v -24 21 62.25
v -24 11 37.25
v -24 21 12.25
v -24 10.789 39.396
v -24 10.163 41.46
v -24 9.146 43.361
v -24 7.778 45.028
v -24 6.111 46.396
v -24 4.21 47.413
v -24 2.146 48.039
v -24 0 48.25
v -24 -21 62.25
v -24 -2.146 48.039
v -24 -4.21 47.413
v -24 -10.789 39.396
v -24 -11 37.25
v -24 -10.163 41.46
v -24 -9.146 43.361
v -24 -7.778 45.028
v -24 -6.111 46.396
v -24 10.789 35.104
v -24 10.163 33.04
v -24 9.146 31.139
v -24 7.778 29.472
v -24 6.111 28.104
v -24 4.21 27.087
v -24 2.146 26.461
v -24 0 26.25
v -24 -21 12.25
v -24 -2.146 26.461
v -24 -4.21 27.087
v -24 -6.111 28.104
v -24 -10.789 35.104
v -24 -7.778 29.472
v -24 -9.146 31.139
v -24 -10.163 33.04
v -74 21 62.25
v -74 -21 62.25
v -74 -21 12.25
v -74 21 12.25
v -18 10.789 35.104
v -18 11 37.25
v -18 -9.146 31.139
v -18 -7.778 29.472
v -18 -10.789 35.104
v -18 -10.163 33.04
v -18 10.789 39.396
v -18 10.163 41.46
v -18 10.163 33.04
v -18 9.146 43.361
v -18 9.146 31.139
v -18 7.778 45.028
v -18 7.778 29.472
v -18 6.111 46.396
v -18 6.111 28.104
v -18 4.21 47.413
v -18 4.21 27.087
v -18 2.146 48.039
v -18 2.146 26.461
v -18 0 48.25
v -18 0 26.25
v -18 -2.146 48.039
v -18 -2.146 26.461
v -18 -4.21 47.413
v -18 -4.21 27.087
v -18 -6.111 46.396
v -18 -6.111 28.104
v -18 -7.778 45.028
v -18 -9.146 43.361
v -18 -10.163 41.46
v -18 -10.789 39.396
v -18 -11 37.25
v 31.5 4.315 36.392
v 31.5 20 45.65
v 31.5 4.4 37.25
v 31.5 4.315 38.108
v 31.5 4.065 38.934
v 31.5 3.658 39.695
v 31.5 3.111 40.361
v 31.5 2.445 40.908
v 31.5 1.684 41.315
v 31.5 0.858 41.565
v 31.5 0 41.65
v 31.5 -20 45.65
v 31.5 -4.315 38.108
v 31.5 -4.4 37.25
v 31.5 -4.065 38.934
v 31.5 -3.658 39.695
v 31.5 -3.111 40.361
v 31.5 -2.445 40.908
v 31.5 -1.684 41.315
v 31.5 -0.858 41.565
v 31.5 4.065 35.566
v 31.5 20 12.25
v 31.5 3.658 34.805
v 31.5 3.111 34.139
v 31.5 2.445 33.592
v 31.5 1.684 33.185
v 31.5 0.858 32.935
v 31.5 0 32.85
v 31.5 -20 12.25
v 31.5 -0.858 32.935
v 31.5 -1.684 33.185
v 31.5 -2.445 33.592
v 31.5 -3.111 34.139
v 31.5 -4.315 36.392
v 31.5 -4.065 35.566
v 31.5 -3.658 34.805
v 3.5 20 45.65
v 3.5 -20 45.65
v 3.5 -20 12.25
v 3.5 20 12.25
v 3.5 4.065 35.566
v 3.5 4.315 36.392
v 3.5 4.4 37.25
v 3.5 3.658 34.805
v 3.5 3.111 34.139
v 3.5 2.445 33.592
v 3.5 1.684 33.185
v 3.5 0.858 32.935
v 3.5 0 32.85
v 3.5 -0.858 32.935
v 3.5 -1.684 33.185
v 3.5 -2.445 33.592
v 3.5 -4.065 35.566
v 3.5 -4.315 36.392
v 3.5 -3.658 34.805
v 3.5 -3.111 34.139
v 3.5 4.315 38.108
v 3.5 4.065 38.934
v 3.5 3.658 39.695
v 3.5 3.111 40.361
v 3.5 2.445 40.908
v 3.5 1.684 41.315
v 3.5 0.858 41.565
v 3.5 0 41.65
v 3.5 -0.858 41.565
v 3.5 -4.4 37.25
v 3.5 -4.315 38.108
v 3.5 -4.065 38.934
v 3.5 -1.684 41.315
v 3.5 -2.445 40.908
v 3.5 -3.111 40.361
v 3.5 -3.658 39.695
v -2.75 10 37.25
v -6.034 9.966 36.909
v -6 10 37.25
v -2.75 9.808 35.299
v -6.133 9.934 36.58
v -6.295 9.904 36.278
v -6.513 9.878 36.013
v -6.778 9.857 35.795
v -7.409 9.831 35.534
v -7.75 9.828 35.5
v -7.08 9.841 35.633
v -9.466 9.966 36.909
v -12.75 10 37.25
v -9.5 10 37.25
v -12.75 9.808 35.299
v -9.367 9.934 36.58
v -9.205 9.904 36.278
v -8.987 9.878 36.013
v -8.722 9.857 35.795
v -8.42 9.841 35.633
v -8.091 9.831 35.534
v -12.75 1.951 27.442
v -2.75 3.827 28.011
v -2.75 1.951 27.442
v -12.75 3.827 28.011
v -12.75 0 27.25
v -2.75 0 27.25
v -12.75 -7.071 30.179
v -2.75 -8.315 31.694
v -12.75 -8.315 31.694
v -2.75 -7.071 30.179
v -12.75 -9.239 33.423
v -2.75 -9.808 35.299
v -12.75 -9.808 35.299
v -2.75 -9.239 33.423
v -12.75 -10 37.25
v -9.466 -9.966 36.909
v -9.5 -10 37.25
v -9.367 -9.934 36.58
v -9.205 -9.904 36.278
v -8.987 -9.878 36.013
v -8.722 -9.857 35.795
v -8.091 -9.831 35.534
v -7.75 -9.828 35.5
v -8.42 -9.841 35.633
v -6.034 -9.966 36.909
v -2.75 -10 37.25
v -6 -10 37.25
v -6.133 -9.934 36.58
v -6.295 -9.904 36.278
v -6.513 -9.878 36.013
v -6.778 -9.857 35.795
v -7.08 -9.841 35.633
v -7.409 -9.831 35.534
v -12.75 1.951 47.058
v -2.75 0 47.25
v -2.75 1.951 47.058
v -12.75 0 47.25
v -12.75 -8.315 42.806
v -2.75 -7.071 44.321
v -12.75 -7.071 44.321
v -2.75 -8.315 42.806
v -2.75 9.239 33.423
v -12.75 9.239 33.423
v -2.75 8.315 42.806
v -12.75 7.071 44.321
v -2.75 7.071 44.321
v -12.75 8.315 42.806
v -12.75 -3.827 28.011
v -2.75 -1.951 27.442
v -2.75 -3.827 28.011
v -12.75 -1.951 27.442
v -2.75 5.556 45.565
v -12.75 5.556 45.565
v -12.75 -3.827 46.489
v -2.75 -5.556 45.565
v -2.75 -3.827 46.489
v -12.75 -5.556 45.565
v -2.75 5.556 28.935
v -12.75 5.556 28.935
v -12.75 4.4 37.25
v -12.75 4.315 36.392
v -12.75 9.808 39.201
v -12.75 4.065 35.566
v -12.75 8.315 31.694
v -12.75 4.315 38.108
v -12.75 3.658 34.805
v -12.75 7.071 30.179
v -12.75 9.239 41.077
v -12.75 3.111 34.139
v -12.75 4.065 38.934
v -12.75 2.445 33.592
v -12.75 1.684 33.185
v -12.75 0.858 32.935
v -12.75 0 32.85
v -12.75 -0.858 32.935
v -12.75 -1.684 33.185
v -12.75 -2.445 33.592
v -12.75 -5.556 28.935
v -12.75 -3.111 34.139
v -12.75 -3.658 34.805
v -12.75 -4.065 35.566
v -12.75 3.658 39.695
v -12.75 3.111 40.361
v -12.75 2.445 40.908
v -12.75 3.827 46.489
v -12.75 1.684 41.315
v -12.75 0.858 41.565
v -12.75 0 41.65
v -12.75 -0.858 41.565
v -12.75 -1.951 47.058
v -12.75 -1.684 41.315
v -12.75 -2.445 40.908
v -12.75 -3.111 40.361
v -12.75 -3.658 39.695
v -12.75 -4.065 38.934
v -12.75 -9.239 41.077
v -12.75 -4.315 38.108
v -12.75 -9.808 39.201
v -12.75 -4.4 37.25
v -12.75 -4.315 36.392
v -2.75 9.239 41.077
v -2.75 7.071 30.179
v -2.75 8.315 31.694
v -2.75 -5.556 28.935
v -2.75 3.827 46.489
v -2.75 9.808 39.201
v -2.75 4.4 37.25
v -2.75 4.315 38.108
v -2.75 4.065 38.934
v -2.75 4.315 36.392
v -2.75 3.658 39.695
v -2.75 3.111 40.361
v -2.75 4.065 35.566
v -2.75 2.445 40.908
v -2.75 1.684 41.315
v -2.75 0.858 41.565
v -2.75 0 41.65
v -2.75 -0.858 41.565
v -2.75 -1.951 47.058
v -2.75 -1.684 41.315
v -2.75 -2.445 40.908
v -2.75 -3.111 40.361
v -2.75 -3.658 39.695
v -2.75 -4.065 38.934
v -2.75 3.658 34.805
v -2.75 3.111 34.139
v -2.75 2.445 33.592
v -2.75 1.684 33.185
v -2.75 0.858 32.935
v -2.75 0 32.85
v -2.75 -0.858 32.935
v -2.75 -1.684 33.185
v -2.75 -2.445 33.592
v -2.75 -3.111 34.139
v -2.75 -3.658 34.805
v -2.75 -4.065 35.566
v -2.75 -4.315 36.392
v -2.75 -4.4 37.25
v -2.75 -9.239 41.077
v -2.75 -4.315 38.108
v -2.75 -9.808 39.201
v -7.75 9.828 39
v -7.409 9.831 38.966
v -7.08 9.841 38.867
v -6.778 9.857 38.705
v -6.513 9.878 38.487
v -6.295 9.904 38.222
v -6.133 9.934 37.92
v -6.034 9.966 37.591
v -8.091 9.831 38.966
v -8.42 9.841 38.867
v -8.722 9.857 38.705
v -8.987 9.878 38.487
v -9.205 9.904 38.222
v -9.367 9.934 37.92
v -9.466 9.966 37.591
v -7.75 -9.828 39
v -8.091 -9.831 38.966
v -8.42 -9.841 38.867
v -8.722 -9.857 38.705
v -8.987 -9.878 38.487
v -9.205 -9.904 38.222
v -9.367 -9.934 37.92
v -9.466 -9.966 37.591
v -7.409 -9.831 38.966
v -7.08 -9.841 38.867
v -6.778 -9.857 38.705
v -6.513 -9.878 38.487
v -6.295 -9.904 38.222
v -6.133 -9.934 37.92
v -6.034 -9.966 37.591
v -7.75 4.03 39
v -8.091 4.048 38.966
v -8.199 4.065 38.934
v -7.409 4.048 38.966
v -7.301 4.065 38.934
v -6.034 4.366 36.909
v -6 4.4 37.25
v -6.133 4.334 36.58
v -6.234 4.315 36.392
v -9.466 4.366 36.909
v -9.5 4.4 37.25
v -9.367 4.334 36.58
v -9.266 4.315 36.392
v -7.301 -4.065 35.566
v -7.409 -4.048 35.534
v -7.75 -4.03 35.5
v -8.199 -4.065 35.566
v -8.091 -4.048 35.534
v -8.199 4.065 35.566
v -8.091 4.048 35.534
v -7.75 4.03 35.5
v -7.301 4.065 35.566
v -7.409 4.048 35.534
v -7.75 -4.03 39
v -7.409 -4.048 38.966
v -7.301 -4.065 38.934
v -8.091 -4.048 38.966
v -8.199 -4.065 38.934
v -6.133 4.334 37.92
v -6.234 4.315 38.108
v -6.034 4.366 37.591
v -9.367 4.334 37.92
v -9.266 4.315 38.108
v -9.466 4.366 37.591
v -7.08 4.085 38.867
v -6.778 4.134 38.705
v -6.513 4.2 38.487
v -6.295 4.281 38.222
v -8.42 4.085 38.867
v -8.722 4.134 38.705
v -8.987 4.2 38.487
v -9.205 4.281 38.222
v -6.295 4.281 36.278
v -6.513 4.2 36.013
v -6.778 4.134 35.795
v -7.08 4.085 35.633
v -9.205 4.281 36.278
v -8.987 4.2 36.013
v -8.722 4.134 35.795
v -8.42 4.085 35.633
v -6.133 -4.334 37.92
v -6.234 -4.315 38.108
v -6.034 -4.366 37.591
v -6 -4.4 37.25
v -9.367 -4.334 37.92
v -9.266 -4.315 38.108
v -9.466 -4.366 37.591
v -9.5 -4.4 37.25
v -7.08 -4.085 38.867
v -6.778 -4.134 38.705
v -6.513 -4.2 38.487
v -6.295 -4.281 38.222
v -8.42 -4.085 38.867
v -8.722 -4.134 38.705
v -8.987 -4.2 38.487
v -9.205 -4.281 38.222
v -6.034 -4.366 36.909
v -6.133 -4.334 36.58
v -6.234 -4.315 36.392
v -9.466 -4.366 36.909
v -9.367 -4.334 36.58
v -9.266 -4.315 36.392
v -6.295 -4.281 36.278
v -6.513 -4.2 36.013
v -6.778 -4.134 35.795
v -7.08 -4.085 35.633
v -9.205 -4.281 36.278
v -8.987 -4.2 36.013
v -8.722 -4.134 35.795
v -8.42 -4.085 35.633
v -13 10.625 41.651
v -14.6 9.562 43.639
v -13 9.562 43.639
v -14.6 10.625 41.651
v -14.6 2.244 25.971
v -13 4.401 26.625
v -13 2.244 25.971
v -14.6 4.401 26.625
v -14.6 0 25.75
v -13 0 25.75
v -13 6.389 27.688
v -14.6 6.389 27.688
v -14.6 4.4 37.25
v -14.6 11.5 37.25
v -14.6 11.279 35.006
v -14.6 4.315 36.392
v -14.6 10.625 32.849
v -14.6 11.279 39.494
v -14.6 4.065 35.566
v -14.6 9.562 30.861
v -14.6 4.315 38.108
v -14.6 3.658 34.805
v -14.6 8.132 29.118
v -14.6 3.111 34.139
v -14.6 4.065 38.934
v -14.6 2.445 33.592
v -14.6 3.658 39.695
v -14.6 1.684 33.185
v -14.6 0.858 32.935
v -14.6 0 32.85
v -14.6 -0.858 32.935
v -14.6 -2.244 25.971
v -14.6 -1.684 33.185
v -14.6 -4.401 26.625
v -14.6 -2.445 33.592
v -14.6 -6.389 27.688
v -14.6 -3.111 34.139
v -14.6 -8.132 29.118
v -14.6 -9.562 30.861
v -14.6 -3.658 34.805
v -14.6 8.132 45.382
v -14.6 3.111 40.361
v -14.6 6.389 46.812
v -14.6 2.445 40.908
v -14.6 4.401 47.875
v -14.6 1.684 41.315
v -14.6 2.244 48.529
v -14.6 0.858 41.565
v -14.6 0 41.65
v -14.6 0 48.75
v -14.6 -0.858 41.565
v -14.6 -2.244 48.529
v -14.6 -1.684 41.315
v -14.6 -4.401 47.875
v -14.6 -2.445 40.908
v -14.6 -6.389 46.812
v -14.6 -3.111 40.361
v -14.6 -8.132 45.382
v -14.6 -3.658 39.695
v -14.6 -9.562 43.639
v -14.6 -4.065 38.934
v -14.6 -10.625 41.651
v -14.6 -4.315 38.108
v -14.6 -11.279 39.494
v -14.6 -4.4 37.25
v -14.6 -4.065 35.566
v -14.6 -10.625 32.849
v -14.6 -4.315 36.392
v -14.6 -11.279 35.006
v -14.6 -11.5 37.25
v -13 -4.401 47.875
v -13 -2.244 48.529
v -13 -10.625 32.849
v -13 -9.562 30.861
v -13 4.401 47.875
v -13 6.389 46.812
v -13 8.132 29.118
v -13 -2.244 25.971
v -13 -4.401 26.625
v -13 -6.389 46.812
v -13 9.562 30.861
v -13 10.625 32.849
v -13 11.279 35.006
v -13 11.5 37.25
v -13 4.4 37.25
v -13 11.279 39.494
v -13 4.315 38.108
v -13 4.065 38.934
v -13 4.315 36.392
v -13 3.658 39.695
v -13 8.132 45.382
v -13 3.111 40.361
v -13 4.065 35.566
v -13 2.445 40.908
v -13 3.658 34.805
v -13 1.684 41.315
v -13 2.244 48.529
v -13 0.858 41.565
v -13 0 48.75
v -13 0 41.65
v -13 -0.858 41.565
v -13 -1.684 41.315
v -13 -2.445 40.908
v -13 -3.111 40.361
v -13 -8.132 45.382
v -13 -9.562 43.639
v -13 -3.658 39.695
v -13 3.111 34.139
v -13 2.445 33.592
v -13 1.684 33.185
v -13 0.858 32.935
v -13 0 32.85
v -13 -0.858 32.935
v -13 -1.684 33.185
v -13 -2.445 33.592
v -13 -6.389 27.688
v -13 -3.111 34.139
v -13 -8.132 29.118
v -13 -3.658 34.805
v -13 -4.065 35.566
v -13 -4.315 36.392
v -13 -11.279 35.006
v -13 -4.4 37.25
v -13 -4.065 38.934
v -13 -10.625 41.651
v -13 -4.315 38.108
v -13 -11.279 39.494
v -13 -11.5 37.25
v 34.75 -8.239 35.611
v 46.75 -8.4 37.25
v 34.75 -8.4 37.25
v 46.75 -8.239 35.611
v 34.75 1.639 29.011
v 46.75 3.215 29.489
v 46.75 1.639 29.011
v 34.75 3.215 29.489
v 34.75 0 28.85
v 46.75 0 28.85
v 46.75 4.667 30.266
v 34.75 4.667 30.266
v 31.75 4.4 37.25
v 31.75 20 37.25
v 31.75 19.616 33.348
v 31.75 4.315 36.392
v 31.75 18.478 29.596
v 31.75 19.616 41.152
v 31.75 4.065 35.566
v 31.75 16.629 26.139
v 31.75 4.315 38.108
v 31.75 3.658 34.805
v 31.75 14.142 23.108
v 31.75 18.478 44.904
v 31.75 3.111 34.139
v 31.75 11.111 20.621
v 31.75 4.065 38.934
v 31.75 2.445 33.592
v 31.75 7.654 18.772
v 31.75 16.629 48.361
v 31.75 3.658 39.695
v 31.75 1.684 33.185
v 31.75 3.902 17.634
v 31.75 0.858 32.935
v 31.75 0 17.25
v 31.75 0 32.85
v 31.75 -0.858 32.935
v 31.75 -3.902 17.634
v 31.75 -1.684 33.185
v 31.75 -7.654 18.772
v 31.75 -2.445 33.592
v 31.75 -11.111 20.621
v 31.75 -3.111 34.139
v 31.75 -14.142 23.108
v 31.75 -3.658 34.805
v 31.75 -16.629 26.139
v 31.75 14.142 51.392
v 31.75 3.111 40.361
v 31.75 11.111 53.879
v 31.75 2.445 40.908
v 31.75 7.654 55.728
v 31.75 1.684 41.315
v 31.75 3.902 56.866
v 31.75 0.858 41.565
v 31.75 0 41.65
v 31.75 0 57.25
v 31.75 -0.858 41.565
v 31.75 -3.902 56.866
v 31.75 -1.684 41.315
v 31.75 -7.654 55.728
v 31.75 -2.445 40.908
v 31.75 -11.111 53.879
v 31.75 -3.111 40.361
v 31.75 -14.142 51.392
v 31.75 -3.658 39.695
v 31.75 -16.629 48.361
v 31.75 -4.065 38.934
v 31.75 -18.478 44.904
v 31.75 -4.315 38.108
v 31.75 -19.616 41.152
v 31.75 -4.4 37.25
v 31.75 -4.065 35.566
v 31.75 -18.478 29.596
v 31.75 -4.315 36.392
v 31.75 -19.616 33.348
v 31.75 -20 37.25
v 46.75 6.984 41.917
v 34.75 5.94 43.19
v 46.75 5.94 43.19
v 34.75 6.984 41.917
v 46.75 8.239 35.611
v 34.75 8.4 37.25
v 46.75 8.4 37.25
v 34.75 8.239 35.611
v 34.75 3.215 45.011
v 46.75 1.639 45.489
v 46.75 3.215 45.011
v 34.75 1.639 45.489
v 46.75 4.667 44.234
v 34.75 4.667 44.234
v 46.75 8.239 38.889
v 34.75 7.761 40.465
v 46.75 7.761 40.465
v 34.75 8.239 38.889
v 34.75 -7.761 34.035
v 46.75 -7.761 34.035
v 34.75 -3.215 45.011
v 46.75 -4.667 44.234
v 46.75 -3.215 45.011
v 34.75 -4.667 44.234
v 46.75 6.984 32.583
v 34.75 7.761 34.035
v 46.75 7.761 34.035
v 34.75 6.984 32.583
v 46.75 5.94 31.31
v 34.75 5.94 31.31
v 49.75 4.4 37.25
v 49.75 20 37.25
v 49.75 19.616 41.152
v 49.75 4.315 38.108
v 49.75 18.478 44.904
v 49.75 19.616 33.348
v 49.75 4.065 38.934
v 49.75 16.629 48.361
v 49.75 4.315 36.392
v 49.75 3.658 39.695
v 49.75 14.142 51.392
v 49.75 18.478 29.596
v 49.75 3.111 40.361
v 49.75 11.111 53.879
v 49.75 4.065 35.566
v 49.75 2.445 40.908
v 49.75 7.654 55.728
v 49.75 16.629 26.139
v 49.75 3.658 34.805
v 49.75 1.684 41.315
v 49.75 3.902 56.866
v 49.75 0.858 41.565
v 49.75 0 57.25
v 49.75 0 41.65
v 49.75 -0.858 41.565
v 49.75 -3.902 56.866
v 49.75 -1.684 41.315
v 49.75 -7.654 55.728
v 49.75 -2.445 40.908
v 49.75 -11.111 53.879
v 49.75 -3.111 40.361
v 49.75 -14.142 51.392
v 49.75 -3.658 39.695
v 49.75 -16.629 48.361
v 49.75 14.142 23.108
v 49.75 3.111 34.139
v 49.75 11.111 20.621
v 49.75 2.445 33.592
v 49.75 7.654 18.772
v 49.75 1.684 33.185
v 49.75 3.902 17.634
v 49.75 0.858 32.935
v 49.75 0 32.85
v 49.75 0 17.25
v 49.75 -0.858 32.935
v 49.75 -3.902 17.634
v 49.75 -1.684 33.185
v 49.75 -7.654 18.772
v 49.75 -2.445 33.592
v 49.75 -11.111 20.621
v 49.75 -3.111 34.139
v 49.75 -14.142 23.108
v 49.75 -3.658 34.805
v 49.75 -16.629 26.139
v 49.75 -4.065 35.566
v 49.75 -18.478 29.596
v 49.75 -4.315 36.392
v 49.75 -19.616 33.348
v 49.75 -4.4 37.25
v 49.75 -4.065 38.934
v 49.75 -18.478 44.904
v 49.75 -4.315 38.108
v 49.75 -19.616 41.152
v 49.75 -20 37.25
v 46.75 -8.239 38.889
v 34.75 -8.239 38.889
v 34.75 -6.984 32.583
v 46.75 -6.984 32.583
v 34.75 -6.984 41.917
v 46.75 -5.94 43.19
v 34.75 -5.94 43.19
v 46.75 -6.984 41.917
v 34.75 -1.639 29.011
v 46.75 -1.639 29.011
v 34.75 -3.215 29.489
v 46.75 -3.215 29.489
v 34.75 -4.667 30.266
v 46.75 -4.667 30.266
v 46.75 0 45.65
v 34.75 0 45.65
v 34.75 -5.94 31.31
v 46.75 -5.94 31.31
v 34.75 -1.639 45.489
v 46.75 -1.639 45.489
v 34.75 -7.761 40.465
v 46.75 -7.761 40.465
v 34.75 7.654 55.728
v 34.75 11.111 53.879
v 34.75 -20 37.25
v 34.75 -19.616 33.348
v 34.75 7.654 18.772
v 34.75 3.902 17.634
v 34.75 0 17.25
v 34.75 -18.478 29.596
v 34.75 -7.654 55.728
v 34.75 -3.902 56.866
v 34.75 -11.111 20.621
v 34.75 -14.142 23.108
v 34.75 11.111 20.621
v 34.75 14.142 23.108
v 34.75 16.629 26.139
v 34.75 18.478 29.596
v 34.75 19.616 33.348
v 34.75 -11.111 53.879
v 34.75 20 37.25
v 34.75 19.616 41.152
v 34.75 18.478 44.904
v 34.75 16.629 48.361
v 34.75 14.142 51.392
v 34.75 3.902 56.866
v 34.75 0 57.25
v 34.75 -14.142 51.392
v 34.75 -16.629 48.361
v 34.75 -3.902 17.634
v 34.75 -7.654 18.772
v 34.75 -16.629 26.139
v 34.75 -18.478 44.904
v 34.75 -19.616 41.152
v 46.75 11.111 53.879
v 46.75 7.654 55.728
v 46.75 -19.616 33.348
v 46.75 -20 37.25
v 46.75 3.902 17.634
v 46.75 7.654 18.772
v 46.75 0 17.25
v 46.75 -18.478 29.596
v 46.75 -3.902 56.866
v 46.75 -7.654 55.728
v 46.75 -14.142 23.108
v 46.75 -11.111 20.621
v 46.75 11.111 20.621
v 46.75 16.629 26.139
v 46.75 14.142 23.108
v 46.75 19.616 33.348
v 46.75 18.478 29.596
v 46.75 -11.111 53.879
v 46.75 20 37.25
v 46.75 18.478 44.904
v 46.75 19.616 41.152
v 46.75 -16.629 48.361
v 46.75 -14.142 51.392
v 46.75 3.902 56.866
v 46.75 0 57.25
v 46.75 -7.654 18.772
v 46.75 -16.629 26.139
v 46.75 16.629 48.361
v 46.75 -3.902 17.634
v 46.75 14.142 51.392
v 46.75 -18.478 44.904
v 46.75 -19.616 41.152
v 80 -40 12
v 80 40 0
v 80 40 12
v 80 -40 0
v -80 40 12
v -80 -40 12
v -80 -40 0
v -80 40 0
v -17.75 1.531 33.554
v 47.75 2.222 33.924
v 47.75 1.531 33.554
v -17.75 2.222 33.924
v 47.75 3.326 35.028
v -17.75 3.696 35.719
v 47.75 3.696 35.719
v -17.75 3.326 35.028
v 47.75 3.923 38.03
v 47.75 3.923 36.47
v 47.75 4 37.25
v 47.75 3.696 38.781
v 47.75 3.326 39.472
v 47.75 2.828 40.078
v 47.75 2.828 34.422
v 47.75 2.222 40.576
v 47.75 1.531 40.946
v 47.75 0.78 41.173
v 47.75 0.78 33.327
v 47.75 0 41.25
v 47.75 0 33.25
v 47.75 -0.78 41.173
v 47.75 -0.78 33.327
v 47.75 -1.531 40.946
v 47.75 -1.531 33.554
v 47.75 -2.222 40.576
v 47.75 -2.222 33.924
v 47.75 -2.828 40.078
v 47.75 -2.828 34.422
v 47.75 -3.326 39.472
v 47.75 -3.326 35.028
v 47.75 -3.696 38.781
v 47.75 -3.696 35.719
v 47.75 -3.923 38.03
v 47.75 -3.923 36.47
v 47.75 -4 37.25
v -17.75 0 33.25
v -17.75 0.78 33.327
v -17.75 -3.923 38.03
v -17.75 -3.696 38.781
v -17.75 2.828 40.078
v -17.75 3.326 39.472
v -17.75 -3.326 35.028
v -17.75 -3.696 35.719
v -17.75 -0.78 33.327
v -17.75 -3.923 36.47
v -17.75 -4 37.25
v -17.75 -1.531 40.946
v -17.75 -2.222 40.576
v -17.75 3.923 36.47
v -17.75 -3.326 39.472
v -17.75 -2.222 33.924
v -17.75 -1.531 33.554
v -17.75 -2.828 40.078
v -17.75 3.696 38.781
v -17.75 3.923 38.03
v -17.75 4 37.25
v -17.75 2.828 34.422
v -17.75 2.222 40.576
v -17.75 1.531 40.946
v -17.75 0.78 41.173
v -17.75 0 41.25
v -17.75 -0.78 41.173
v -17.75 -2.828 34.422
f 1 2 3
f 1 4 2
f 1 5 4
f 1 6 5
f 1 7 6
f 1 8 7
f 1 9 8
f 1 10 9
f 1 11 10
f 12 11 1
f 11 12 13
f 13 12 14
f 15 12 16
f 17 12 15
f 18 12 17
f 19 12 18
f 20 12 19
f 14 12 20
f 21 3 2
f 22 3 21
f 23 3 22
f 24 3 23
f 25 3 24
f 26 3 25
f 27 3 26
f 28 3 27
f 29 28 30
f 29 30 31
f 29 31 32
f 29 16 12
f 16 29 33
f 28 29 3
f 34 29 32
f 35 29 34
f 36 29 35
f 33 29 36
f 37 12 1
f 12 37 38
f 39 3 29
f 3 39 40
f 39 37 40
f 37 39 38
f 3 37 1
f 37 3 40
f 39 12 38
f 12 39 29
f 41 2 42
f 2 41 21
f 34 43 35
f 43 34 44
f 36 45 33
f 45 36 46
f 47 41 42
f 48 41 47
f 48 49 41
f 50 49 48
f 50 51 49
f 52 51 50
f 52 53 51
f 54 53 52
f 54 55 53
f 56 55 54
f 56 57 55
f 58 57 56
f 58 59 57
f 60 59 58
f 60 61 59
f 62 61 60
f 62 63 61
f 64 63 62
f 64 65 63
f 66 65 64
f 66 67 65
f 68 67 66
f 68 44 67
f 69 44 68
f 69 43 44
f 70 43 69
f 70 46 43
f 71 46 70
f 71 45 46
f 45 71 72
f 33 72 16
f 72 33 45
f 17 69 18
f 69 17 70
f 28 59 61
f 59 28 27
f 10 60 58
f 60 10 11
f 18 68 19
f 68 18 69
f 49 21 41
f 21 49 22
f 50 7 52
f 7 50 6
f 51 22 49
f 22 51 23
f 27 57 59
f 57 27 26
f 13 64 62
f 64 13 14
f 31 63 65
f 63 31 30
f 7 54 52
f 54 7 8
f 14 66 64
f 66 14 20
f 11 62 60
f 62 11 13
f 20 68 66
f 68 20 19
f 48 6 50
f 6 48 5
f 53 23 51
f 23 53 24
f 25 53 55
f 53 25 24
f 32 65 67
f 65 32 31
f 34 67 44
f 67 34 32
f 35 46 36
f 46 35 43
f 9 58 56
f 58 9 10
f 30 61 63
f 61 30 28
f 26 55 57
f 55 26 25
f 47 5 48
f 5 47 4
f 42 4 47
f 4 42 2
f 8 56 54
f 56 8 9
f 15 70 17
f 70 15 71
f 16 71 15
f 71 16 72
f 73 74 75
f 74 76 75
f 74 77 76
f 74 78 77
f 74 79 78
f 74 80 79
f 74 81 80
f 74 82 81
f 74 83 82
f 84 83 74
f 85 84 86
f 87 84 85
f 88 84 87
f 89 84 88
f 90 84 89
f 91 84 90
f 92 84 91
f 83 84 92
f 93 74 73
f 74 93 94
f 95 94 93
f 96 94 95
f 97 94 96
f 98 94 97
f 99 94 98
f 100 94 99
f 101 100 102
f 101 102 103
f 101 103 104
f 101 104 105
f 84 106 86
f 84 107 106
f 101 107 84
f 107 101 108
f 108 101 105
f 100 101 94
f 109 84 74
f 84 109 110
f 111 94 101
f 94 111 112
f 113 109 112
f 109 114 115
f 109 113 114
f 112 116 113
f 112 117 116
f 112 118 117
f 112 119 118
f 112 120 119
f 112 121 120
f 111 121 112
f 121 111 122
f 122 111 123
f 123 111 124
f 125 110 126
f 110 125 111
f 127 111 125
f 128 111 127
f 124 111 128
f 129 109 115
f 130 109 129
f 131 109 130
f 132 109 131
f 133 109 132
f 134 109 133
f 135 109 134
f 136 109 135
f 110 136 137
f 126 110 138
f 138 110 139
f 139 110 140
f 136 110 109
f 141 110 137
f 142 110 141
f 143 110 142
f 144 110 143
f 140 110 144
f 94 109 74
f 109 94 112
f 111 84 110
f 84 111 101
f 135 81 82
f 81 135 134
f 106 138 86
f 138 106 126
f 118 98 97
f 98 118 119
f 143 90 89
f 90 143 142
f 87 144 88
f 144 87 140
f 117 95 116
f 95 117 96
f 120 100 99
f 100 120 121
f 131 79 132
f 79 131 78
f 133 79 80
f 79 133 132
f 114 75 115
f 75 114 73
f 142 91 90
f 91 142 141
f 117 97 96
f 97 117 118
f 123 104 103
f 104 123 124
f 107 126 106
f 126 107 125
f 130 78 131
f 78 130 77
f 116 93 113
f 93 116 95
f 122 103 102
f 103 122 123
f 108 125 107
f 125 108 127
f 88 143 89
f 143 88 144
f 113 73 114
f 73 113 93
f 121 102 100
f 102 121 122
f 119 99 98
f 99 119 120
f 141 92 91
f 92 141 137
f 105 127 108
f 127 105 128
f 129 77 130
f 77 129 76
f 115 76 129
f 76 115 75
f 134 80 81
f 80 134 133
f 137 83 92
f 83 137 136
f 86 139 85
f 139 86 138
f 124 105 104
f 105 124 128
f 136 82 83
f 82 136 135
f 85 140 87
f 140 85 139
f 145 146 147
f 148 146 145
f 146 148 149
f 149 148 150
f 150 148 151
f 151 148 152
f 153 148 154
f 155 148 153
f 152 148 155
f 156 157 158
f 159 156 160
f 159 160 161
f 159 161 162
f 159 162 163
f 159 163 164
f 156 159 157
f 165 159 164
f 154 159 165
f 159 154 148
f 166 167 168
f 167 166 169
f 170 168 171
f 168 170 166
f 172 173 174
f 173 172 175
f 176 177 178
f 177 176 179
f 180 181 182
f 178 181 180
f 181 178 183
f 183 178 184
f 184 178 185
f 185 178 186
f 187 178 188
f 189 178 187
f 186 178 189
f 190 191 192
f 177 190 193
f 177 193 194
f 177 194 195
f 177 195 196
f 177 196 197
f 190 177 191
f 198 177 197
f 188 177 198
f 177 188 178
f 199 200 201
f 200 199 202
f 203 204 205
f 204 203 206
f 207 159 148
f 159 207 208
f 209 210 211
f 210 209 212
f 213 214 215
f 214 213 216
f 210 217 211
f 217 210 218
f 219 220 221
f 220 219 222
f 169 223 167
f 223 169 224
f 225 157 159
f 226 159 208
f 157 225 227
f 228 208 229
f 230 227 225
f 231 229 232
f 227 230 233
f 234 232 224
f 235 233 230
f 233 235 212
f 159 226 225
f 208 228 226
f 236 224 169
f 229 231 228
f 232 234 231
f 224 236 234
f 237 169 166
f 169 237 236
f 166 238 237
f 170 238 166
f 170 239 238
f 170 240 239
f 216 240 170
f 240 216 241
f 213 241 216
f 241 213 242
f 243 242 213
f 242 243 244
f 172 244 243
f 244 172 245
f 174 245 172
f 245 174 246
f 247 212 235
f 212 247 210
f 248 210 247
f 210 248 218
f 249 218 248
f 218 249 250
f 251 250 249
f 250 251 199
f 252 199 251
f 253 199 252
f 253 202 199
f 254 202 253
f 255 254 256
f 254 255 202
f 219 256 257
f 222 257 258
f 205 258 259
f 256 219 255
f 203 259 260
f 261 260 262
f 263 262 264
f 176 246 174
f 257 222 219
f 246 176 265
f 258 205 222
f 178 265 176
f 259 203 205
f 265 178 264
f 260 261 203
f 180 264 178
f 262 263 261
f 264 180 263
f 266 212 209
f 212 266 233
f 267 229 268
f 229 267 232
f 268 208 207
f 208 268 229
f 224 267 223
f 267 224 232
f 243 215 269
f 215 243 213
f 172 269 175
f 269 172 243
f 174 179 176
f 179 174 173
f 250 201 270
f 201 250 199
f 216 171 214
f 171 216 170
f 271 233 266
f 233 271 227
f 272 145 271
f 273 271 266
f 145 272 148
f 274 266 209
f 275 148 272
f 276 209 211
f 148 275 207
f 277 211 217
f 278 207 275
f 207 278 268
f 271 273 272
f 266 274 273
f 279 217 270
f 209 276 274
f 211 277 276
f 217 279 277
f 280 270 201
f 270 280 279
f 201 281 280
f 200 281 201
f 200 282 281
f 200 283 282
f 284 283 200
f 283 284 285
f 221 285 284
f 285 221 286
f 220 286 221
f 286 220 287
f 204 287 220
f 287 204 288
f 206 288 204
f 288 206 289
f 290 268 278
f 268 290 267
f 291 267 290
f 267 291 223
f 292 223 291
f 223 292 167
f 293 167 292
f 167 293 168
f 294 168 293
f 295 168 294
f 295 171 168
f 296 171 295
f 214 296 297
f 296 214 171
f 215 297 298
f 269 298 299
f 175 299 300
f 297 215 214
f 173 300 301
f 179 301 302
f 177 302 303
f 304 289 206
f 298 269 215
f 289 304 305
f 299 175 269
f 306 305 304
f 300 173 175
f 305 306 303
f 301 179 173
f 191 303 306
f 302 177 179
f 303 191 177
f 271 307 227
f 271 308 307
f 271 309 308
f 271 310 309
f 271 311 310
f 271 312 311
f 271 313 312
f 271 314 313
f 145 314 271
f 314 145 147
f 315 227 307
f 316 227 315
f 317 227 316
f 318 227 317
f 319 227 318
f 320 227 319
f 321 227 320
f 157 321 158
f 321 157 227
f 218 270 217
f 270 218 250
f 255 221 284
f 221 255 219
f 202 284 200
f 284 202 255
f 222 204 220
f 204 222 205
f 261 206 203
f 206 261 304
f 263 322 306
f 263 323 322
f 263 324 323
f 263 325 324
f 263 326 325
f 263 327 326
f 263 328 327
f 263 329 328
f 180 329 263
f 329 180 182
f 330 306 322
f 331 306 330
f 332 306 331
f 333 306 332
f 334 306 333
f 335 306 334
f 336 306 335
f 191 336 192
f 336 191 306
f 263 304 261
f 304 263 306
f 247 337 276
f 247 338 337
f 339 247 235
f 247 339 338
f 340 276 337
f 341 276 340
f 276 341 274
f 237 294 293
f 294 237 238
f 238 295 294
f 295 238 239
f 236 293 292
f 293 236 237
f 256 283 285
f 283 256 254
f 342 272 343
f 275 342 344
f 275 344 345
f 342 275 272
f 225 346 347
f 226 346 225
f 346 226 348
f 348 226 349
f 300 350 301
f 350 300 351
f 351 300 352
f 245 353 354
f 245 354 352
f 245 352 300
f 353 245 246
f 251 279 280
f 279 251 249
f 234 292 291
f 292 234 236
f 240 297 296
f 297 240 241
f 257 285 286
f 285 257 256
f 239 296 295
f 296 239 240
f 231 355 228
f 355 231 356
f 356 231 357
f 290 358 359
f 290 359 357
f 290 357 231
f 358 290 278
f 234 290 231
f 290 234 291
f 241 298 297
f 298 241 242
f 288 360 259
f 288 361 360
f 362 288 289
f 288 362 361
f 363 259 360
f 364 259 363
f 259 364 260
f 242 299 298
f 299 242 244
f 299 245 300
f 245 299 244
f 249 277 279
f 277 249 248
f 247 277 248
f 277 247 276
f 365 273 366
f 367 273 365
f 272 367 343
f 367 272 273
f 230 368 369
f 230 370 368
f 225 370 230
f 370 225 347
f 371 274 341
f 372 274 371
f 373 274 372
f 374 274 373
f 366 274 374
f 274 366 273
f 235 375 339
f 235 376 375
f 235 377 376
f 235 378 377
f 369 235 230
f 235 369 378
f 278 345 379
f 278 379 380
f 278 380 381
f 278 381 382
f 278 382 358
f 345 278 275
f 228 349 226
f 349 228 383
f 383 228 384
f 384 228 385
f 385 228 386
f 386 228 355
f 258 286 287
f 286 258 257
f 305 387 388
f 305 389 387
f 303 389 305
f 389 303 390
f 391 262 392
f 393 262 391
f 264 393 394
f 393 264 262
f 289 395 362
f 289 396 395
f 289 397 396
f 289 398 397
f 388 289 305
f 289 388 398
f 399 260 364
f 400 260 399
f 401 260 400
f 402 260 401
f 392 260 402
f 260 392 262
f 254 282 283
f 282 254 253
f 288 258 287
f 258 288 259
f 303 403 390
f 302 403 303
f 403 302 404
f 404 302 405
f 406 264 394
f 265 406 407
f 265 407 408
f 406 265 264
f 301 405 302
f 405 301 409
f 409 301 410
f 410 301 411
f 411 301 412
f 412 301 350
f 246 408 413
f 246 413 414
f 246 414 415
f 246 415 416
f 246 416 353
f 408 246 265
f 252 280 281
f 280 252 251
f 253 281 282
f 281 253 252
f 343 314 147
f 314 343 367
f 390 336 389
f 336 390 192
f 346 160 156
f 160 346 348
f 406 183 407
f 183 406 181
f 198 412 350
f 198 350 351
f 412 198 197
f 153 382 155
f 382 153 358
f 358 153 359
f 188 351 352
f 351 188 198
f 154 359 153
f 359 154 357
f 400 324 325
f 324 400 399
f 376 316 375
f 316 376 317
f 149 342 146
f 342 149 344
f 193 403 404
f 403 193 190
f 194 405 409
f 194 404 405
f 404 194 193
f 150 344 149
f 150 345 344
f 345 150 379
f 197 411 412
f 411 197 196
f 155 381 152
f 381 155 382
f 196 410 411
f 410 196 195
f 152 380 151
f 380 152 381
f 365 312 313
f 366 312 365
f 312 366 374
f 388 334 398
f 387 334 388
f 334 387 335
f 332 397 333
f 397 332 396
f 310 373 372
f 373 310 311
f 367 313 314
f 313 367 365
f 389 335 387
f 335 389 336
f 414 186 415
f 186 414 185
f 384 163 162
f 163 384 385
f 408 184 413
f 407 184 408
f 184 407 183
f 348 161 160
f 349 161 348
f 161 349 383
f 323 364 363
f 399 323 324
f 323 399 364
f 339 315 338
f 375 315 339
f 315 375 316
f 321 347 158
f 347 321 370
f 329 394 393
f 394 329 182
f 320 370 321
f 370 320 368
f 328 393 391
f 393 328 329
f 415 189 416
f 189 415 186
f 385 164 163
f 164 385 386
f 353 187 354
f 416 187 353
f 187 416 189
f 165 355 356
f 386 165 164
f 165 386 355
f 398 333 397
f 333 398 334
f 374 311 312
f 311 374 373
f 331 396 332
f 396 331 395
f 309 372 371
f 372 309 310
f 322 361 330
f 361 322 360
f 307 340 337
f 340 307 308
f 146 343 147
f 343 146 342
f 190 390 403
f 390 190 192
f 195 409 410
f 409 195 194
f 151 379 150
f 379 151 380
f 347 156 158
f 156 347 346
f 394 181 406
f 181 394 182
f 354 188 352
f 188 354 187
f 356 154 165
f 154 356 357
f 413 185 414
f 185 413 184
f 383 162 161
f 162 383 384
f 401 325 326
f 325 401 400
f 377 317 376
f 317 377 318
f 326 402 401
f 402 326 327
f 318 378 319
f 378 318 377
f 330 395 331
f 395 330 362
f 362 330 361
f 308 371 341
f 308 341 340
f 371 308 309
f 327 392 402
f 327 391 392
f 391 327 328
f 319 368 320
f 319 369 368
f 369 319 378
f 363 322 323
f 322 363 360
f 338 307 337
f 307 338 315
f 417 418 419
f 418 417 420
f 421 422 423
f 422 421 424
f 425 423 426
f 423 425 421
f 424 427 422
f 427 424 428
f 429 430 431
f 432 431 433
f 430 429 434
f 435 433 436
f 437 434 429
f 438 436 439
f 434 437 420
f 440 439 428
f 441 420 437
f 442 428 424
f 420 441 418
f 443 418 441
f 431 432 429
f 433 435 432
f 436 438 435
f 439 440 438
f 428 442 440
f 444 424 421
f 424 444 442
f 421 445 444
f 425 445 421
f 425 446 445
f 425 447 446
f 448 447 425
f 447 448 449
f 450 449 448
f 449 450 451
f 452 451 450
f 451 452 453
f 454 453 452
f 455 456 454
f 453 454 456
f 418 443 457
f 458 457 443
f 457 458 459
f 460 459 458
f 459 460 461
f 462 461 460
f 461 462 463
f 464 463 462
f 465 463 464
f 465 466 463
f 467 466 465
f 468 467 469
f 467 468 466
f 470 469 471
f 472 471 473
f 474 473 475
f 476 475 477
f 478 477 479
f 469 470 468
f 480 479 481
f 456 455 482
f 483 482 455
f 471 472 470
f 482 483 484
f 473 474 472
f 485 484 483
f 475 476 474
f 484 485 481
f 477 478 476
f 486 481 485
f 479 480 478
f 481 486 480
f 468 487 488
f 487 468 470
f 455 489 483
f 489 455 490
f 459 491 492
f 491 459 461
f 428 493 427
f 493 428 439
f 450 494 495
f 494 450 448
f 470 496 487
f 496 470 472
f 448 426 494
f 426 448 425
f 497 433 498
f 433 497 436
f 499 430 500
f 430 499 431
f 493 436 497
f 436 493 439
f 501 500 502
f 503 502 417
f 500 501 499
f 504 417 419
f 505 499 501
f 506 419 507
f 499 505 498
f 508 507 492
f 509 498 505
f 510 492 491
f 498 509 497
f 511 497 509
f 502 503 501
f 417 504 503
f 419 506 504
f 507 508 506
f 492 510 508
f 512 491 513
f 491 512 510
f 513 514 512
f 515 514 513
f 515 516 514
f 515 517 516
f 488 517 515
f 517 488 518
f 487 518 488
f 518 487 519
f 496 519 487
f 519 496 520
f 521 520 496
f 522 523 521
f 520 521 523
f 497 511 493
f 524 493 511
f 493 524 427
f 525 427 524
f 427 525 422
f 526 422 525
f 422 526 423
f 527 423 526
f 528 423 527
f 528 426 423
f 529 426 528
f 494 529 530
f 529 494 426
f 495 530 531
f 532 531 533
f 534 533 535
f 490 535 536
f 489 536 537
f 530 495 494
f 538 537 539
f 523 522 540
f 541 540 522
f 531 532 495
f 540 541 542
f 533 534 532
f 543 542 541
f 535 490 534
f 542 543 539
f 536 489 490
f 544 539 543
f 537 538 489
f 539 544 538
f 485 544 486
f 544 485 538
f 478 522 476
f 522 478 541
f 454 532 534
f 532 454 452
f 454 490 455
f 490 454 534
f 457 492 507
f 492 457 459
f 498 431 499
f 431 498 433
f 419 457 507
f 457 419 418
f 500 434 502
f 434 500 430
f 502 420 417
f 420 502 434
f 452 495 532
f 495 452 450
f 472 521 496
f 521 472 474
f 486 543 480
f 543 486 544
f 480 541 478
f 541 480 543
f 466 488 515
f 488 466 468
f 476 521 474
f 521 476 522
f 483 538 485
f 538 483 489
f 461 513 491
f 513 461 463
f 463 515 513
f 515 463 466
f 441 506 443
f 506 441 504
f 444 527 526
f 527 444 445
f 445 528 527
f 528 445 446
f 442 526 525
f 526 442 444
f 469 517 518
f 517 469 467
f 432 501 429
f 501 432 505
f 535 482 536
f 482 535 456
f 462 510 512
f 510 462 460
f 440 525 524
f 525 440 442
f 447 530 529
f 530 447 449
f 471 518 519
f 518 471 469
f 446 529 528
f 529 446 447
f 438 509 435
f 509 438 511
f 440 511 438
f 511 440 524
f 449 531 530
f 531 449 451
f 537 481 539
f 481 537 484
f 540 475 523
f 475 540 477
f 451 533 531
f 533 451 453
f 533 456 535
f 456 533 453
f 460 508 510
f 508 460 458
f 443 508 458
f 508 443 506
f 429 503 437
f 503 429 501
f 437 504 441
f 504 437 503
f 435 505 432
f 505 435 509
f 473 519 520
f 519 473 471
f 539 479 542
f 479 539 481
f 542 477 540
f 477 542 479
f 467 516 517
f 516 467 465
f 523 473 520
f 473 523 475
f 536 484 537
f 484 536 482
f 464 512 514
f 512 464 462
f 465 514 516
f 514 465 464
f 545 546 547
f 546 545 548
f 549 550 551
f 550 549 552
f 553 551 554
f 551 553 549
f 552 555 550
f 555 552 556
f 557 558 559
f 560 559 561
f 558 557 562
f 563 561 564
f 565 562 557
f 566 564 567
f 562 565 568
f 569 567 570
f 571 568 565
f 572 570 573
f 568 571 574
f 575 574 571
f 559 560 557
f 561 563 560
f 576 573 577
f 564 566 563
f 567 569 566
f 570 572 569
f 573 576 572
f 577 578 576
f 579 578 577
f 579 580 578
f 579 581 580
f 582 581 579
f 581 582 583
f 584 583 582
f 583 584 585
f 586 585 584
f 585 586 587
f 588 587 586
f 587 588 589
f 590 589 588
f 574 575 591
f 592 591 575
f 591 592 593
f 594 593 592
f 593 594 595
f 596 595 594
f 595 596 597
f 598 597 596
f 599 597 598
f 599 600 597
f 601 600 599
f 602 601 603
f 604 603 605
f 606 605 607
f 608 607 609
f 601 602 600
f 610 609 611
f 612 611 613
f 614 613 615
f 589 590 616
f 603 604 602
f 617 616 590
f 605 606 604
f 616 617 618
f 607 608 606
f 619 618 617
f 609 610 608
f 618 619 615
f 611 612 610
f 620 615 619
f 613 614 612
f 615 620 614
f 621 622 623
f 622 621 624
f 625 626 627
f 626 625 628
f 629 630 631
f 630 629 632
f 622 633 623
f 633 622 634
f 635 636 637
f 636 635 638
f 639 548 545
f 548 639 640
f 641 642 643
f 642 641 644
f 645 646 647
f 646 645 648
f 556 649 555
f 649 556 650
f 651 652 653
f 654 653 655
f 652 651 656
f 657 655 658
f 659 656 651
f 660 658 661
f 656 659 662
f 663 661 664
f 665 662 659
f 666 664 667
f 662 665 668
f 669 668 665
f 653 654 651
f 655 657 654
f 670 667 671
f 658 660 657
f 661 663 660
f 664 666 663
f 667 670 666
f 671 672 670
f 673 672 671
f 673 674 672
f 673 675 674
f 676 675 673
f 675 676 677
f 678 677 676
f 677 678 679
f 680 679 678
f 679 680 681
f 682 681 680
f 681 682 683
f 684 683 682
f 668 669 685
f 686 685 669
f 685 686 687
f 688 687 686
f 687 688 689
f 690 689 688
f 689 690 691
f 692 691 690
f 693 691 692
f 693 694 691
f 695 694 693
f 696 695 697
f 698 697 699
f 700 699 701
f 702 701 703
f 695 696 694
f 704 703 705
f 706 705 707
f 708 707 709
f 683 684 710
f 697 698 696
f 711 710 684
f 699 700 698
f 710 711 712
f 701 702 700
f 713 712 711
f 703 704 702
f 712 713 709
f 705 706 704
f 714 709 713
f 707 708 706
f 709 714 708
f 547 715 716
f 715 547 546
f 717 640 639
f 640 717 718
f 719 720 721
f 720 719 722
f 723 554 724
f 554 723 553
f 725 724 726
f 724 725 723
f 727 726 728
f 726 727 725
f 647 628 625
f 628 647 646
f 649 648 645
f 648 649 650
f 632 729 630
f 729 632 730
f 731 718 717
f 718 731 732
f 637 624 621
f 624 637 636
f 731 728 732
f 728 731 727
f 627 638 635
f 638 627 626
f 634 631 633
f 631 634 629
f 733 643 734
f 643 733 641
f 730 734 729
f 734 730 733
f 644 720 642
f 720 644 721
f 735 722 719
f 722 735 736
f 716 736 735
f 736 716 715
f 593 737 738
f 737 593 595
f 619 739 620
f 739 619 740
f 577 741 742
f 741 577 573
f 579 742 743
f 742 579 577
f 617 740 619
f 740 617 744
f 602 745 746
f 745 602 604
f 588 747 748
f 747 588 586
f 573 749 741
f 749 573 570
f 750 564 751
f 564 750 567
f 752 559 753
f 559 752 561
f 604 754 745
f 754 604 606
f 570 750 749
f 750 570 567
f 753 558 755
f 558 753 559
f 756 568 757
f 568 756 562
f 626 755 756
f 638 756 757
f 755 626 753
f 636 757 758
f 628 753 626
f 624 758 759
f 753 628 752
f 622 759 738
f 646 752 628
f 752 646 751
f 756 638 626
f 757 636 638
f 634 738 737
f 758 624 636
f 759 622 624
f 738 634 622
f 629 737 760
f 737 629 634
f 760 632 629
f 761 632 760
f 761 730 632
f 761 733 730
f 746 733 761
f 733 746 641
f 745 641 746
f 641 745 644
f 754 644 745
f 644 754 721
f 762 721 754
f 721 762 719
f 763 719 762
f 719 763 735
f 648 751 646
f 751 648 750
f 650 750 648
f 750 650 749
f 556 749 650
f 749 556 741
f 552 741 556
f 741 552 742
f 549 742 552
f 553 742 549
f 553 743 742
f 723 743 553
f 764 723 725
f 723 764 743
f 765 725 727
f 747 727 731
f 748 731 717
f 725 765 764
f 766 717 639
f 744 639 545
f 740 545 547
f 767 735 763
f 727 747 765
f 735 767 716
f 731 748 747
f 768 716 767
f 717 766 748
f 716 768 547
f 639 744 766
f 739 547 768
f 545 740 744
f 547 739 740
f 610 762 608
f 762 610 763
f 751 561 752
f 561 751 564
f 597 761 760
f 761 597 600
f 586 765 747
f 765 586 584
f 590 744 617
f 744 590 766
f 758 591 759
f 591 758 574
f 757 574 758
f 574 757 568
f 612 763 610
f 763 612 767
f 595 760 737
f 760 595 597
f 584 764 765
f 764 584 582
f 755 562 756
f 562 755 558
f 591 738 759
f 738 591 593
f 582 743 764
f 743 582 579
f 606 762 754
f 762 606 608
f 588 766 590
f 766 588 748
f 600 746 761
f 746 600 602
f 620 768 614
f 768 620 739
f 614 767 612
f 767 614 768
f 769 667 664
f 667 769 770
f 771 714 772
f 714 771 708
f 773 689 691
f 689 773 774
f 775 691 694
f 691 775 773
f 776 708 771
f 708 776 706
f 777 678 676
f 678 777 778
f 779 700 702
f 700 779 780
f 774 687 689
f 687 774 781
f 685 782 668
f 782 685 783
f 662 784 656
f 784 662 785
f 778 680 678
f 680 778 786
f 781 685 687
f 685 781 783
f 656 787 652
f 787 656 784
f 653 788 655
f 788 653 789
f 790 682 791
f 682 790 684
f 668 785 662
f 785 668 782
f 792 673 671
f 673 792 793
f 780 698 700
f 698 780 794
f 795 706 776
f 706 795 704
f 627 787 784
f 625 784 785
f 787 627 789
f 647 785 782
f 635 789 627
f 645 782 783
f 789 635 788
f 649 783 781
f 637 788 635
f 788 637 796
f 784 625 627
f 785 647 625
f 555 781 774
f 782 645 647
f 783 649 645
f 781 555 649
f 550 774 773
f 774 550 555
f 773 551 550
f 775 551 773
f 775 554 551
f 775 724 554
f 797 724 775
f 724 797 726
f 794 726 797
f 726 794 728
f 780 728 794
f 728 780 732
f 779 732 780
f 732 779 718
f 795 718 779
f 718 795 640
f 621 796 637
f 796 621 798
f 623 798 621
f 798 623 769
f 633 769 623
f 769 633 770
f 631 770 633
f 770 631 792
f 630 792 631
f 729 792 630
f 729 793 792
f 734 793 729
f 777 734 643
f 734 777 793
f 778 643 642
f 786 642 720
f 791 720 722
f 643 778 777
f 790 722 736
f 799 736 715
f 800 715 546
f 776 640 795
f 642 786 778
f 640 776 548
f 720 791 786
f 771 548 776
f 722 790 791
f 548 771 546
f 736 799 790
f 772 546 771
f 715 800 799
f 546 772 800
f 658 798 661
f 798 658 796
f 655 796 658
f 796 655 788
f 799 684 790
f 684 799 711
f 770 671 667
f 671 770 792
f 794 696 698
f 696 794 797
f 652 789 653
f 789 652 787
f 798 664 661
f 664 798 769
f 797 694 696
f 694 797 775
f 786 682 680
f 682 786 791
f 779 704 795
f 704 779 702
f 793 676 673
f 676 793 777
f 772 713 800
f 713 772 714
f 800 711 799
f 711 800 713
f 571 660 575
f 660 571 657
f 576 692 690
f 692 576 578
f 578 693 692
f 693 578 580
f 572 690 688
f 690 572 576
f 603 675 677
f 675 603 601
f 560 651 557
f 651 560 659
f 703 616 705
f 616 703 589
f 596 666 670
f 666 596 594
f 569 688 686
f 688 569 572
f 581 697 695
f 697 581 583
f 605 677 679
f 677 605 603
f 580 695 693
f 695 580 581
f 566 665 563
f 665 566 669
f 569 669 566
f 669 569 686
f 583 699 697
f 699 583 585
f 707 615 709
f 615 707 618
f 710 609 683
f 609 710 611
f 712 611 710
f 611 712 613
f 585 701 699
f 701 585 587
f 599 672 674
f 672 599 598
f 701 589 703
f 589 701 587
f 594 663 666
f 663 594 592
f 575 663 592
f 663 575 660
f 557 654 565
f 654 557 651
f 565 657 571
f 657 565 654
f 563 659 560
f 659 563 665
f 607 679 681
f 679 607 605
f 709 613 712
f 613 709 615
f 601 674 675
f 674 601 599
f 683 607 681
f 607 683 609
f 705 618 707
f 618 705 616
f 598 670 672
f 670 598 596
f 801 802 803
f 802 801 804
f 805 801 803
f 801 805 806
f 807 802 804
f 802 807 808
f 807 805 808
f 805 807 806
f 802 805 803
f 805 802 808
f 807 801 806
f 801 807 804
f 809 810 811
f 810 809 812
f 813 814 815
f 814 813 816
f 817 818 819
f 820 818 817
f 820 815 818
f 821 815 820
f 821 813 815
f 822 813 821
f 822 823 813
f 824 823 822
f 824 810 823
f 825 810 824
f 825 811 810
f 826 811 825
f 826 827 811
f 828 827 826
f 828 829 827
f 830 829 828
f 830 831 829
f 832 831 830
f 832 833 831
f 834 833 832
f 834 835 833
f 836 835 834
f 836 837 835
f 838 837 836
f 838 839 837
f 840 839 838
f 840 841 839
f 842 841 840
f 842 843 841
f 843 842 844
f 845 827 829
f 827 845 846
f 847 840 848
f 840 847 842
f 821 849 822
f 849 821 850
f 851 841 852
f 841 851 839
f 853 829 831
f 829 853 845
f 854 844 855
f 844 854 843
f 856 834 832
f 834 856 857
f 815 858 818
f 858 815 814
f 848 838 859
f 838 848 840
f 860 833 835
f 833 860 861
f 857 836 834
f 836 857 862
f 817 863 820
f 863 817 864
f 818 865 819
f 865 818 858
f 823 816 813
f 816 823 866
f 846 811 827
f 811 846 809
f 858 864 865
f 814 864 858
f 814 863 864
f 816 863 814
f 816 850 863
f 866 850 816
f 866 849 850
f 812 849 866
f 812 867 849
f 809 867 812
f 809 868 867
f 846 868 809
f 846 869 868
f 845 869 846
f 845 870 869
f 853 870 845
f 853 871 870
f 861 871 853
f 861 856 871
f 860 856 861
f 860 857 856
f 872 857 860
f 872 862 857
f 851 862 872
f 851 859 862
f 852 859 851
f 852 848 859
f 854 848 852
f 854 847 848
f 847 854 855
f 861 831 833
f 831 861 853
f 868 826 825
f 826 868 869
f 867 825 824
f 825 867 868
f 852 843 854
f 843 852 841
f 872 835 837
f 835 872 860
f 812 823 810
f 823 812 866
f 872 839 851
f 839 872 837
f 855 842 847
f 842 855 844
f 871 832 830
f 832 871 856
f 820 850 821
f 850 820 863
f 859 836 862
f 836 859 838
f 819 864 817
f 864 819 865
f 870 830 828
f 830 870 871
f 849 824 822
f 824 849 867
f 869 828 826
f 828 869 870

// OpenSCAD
$fn = 32;

// ------------------------------------------------------------------------
// Motor drive station: motor 50 x 50 mm, shaft d8, pulley d40
// Every part is its own module, assembly() places every instance.
// ------------------------------------------------------------------------

// --- part 1 ---
module station_bed() {
  difference() {
    translate([-80, -40, 0]) cube([160, 80, 12]);
  }
}

// --- part 2 ---
module drive_motor() {
  union() {
    translate([-25, -21, 0]) cube([50, 42, 50]);
    translate([28, 0, 25]) rotate([0, 90, 0]) cylinder(h = 6, d = 22, center = true);
  }
}

// --- part 3 ---
module pillow_block() {
  difference() {
    translate([-14, -20, 0]) cube([28, 40, 33.4]);
    translate([0, 0, 25]) rotate([0, 90, 0]) cylinder(h = 30, d = 8.8, center = true);
  }
}

// --- part 4 ---
module drive_shaft() {
  translate([0, 0, -32.75]) cylinder(h = 65.5, d = 8);
}

// --- part 5 ---
module shaft_collar() {
  difference() {
    cylinder(h = 10, d = 20);
    translate([0, 0, -1]) cylinder(h = 12, d = 8.8);
    translate([0, 0, 5]) rotate([90, 0, 0]) cylinder(h = 22, d = 3.5, center = true);
  }
}

// --- part 6 ---
module collar_washer() {
  difference() {
      translate([0, 0, 0]) cylinder(h = 1.6, d = 23);
      translate([0, 0, -1]) cylinder(h = 3.6, d = 8.8);
    }
}

// --- part 7 ---
module drive_pulley() {
  difference() {
    union() {
      cylinder(h = 18, d = 16.8);
      cylinder(h = 3, d = 40);
      translate([0, 0, 15]) cylinder(h = 3, d = 40);
    }
    translate([0, 0, -1]) cylinder(h = 20, d = 8.8);
  }
}

// --- assembly ---
module assembly() {
  color([0.80, 0.24, 0.20]) translate([0, 0, 0]) rotate([0, 0, 0]) station_bed();
  color([0.20, 0.45, 0.75]) translate([-49, 0, 12.25]) rotate([0, 0, 0]) drive_motor();
  color([0.25, 0.62, 0.32]) translate([17.5, 0, 12.25]) rotate([0, 0, 0]) pillow_block();
  color([0.92, 0.70, 0.18]) translate([15, 0, 37.25]) rotate([0, 90, 0]) drive_shaft();
  color([0.58, 0.35, 0.70]) translate([-12.75, 0, 37.25]) rotate([0, 90, 0]) shaft_collar();
  color([0.16, 0.66, 0.66]) translate([-14.6, 0, 37.25]) rotate([0, 90, 0]) collar_washer();
  color([0.85, 0.48, 0.18]) translate([31.75, 0, 37.25]) rotate([0, 90, 0]) drive_pulley();
}

assembly();
